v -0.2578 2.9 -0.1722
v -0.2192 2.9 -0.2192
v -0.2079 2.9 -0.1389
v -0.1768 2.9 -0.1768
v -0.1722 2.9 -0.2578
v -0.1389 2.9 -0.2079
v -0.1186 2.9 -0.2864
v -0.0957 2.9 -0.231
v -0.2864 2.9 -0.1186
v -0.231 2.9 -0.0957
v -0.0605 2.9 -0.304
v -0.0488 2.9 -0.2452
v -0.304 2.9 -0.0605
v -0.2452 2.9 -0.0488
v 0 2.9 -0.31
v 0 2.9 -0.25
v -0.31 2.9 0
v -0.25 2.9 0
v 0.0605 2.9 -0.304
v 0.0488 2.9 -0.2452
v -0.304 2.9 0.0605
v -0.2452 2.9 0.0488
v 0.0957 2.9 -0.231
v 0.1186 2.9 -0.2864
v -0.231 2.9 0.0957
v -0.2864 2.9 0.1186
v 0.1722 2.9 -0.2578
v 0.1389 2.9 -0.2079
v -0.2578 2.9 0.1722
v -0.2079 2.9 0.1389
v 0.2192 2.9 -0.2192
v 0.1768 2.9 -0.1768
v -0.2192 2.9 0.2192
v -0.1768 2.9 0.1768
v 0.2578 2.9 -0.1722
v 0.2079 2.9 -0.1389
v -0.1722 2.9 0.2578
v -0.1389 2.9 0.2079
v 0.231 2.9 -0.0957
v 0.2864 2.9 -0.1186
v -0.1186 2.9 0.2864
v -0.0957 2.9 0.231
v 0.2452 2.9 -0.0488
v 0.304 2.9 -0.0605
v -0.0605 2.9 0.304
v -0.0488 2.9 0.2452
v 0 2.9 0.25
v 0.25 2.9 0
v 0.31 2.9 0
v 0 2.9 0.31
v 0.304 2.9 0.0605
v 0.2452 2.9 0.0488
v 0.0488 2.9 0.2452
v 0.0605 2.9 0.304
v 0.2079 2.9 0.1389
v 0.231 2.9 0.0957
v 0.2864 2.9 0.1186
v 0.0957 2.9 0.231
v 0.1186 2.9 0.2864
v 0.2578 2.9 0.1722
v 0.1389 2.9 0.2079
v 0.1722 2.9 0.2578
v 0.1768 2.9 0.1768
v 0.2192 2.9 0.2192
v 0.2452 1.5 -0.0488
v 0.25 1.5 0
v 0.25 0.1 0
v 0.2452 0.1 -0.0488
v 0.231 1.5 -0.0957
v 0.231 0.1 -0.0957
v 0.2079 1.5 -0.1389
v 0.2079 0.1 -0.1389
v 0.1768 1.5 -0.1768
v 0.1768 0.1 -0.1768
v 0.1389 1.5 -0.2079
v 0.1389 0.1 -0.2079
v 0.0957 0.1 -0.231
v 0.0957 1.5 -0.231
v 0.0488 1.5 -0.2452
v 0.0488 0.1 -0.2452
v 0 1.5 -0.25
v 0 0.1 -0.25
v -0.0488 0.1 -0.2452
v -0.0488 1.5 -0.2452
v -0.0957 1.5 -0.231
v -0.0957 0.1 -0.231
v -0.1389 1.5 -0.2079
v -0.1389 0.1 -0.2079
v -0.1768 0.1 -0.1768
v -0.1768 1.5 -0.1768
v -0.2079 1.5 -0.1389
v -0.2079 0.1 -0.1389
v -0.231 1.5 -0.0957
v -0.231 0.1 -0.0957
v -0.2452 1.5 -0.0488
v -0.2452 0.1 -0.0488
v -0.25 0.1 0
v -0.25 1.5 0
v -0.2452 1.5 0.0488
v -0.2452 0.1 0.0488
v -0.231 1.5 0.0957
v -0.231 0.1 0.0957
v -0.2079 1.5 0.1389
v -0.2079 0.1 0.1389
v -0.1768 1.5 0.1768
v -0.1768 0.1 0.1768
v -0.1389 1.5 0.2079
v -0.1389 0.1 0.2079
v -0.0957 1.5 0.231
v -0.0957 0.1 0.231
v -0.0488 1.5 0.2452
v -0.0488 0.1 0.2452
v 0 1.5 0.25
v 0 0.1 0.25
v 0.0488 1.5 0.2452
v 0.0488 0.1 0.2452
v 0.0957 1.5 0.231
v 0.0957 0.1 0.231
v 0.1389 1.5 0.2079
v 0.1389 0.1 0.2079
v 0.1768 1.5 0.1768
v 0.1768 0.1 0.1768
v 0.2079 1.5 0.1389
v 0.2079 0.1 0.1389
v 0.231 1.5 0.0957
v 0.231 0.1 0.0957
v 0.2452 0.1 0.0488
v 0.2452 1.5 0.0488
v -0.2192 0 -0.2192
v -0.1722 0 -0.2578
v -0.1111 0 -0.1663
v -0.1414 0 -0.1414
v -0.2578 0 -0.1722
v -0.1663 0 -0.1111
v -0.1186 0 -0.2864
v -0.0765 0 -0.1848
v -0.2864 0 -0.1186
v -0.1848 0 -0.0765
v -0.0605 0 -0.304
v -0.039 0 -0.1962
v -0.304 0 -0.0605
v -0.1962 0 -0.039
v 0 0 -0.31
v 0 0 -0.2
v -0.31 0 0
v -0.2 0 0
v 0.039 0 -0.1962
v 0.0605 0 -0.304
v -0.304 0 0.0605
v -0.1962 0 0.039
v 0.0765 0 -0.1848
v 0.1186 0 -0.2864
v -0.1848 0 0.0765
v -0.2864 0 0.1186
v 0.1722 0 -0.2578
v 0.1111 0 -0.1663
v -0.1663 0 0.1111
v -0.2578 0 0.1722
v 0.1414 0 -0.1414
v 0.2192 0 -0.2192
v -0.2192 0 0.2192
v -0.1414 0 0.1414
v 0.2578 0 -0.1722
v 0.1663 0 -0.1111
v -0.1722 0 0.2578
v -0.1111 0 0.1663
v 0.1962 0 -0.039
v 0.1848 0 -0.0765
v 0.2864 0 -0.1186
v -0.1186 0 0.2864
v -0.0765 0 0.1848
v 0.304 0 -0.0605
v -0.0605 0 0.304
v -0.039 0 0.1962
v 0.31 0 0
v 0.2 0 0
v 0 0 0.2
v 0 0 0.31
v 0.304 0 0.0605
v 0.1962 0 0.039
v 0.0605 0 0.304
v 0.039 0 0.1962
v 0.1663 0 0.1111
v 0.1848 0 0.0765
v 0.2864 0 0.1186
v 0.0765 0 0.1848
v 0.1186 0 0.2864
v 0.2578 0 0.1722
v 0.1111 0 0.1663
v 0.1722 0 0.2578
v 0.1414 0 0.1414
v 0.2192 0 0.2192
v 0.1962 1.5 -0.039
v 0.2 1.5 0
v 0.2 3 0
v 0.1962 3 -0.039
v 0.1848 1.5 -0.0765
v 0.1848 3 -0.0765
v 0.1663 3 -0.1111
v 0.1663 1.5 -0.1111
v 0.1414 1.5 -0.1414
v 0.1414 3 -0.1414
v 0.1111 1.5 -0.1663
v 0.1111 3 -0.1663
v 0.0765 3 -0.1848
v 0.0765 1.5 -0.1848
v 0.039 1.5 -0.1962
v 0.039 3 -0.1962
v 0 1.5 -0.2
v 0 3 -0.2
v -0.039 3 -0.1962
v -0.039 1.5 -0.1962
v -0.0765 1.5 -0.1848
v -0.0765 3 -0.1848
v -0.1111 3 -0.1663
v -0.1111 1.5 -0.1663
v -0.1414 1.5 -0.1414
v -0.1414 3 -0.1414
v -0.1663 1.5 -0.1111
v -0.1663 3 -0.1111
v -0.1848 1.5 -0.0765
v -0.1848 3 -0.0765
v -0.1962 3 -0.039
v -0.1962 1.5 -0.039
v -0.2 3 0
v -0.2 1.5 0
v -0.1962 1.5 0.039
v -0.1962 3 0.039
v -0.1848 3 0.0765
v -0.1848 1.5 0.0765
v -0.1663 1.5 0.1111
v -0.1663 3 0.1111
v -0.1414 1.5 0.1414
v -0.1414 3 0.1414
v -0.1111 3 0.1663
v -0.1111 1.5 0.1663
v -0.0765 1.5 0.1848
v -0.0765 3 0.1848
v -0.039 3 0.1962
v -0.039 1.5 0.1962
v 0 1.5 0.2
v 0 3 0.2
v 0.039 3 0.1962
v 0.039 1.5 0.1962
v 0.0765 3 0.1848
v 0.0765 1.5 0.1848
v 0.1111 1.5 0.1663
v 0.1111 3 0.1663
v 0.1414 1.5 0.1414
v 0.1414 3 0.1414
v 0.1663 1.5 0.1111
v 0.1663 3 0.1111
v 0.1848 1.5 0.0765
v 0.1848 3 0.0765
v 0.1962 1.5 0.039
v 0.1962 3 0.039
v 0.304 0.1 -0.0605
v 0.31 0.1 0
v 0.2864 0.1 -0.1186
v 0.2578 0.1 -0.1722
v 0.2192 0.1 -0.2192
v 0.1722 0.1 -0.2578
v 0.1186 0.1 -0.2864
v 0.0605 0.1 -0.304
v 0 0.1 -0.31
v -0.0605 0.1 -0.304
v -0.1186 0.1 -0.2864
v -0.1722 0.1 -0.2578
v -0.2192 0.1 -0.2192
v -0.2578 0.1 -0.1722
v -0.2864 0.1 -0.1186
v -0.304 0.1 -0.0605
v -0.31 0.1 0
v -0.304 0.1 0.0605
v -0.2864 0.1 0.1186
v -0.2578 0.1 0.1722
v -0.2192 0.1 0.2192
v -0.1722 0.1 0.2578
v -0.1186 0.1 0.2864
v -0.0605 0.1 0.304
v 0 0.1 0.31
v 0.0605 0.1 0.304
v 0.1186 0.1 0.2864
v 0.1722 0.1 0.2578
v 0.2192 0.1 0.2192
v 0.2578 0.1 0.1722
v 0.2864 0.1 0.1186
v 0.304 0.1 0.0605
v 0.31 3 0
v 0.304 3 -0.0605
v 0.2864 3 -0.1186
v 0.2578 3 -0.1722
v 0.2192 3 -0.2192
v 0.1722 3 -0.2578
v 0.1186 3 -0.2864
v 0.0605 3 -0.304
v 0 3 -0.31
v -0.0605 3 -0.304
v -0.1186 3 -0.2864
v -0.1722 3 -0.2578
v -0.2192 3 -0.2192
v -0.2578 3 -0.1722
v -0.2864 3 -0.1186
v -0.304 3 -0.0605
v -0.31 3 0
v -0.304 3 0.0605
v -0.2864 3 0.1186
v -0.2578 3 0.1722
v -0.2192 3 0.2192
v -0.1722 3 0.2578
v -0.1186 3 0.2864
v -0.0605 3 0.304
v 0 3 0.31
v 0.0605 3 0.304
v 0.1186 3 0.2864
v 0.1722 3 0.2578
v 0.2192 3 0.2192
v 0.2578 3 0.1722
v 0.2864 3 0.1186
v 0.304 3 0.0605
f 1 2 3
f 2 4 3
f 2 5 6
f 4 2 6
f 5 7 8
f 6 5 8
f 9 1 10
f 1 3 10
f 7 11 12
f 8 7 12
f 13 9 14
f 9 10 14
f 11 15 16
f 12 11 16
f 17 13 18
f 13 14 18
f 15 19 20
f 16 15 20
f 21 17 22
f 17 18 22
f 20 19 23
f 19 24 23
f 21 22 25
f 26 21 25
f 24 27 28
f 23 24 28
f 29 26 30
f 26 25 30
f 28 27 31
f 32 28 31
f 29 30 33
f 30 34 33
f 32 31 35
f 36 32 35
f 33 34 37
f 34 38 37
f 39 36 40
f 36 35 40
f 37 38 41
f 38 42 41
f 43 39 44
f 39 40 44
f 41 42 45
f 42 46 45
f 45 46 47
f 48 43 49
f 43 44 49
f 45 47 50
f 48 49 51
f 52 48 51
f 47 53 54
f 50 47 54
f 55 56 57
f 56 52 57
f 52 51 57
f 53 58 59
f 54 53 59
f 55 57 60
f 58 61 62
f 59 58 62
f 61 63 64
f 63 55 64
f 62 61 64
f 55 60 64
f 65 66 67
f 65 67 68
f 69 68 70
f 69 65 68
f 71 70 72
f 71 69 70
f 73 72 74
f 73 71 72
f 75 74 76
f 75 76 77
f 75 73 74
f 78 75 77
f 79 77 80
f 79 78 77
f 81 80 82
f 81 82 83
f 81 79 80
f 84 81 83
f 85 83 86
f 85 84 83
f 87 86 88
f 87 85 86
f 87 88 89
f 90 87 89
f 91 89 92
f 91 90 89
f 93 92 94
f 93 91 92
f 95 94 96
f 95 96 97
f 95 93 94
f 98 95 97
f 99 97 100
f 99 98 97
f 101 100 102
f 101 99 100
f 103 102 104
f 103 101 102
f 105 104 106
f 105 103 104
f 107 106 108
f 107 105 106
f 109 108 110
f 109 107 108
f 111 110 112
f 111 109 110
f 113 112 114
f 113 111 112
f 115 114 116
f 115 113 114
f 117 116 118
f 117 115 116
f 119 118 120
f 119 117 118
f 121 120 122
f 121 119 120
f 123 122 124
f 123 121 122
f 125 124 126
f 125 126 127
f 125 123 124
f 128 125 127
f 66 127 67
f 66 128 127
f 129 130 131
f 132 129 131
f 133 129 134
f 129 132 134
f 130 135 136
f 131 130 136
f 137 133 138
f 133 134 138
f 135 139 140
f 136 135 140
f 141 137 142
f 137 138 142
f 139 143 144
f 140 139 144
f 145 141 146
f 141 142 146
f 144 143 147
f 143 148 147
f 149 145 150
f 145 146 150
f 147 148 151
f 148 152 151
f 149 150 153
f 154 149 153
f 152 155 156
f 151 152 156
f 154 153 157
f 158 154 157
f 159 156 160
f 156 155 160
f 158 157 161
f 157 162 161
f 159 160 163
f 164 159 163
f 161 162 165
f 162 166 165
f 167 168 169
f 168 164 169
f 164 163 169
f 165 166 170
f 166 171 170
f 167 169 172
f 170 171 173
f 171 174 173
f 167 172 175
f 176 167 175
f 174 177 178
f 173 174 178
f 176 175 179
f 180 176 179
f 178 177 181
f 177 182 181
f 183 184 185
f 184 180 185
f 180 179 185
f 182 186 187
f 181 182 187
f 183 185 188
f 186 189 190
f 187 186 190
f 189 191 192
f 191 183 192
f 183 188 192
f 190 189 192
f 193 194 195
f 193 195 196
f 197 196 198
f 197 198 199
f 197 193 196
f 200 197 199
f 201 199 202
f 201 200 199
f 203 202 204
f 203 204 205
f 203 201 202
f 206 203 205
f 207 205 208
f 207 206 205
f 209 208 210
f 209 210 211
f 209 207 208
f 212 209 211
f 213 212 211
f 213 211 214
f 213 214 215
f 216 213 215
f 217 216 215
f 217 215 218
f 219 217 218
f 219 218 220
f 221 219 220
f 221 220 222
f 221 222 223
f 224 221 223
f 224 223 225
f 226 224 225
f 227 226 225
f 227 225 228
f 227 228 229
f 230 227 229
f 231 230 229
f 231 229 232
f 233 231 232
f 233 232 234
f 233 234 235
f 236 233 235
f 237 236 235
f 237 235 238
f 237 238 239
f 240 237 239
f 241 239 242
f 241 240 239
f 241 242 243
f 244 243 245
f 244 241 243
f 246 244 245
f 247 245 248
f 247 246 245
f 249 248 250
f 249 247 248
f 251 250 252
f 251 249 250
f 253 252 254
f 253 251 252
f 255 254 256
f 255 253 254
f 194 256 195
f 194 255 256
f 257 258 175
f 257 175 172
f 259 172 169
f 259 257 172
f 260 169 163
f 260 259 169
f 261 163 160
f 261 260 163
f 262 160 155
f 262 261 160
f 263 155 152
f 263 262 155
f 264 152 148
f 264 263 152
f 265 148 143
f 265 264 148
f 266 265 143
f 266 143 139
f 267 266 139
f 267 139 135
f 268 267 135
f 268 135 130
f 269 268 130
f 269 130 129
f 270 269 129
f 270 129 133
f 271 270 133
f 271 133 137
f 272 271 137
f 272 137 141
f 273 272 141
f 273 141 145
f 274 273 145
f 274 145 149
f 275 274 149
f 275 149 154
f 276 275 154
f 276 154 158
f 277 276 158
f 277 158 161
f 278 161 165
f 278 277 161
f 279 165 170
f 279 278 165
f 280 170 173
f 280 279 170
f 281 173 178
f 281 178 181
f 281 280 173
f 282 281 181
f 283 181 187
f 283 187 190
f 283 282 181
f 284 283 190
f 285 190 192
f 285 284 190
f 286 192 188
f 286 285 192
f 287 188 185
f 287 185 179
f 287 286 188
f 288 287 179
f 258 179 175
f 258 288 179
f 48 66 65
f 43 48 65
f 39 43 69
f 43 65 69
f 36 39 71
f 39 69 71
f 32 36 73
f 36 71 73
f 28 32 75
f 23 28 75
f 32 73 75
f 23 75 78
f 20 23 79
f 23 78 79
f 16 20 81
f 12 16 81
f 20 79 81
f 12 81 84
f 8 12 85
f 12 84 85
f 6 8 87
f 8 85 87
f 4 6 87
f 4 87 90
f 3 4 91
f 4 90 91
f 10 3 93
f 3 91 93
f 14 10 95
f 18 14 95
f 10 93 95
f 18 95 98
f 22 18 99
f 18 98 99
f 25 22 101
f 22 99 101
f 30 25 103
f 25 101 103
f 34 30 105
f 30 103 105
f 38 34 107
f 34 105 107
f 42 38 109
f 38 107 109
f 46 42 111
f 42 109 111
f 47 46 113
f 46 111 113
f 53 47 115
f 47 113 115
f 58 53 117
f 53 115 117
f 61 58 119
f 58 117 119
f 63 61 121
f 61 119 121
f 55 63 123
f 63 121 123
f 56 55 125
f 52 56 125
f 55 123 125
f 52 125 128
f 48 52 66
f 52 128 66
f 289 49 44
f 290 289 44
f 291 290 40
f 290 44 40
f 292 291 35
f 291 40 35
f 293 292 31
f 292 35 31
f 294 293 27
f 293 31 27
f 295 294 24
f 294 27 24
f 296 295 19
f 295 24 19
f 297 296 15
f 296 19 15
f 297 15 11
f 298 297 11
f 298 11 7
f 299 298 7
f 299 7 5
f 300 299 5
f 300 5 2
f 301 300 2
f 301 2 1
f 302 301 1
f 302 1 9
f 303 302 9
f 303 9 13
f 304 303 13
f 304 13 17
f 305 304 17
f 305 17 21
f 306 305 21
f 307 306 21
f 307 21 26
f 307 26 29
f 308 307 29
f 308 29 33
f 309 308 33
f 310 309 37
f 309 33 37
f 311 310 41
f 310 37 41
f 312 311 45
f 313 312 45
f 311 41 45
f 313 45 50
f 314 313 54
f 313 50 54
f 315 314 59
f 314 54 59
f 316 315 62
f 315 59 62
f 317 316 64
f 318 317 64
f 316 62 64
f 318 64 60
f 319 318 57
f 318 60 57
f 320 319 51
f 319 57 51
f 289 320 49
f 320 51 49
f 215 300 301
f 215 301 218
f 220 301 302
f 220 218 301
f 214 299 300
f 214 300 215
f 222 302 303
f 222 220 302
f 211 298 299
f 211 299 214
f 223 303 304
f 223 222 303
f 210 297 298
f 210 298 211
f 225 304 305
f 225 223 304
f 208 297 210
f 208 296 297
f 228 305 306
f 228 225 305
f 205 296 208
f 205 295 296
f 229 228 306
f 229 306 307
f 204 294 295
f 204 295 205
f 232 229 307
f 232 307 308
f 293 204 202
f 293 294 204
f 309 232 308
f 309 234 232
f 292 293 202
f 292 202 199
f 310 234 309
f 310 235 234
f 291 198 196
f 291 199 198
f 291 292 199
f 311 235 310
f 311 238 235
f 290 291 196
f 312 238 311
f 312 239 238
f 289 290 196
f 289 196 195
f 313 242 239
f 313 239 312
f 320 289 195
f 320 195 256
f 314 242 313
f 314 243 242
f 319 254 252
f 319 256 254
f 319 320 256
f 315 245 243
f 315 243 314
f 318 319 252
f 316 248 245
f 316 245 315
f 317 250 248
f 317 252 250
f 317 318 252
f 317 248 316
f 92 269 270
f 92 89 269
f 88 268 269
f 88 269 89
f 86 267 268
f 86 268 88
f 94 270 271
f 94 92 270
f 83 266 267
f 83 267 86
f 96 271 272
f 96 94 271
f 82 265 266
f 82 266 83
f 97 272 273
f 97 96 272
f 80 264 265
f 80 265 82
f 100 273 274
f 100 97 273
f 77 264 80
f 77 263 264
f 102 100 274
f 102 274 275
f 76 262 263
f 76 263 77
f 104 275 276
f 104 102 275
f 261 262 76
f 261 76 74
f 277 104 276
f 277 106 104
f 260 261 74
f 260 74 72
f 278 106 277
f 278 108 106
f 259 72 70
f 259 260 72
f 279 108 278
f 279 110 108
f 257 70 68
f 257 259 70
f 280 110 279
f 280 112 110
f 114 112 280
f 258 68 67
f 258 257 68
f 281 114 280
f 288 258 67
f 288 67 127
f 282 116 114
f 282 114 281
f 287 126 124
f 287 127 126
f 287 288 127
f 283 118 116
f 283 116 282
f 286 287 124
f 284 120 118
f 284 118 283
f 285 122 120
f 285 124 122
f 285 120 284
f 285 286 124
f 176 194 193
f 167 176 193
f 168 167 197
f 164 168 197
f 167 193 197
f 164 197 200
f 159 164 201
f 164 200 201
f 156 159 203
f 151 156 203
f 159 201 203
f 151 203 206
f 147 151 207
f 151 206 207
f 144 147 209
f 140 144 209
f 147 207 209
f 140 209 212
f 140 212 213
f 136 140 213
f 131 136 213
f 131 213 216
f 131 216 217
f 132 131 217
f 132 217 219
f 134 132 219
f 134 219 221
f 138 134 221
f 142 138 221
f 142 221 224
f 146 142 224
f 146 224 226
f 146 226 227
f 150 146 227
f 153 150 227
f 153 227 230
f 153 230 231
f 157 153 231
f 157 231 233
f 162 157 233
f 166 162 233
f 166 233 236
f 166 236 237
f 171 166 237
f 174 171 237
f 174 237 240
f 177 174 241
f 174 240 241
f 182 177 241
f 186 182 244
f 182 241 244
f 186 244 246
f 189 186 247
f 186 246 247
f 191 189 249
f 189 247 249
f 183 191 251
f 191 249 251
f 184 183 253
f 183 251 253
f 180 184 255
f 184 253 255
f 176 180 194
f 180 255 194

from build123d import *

# Parameters (mm, degrees)
SKETCH3_R   = 0.25
SKETCH3_R_2 = 0.2
SKETCH6_R   = 0.31
SKETCH6_R_2 = 0.21


with BuildPart() as part:
    # Sweep-Thin1: sweep along a path in Sketch1
    with BuildLine(Plane.XY) as sweep_thin1_path:
        Line((0, 0), (0, 1.5))
    # Sketch3 → Sweep-Thin1 (sweep)
    with BuildSketch(Plane(origin=(0, 0, 0), x_dir=(1, 0, 0), z_dir=(0, 1, 0))):
        Circle(SKETCH3_R)
        Circle(SKETCH3_R_2, mode=Mode.SUBTRACT)
    sweep(path=sweep_thin1_path.line)

    # Sweep-Thin2: sweep along a path in Sketch5
    with BuildLine(Plane.XY) as sweep_thin2_path:
        Line((0, 0), (0, 0.1))
    # Sketch6 → Sweep-Thin2 (sweep)
    with BuildSketch(Plane(origin=(0, 0, 0), x_dir=(1, 0, 0), z_dir=(0, 1, 0))):
        Circle(SKETCH6_R)
        Circle(SKETCH6_R_2, mode=Mode.SUBTRACT)
    sweep(path=sweep_thin2_path.line)

    # Mirror2: part across plane


with BuildPart() as part_1:
    add(part.part)
    add(part.part.mirror(Plane.ZX.offset(1.5)))


solid = part_1.part
